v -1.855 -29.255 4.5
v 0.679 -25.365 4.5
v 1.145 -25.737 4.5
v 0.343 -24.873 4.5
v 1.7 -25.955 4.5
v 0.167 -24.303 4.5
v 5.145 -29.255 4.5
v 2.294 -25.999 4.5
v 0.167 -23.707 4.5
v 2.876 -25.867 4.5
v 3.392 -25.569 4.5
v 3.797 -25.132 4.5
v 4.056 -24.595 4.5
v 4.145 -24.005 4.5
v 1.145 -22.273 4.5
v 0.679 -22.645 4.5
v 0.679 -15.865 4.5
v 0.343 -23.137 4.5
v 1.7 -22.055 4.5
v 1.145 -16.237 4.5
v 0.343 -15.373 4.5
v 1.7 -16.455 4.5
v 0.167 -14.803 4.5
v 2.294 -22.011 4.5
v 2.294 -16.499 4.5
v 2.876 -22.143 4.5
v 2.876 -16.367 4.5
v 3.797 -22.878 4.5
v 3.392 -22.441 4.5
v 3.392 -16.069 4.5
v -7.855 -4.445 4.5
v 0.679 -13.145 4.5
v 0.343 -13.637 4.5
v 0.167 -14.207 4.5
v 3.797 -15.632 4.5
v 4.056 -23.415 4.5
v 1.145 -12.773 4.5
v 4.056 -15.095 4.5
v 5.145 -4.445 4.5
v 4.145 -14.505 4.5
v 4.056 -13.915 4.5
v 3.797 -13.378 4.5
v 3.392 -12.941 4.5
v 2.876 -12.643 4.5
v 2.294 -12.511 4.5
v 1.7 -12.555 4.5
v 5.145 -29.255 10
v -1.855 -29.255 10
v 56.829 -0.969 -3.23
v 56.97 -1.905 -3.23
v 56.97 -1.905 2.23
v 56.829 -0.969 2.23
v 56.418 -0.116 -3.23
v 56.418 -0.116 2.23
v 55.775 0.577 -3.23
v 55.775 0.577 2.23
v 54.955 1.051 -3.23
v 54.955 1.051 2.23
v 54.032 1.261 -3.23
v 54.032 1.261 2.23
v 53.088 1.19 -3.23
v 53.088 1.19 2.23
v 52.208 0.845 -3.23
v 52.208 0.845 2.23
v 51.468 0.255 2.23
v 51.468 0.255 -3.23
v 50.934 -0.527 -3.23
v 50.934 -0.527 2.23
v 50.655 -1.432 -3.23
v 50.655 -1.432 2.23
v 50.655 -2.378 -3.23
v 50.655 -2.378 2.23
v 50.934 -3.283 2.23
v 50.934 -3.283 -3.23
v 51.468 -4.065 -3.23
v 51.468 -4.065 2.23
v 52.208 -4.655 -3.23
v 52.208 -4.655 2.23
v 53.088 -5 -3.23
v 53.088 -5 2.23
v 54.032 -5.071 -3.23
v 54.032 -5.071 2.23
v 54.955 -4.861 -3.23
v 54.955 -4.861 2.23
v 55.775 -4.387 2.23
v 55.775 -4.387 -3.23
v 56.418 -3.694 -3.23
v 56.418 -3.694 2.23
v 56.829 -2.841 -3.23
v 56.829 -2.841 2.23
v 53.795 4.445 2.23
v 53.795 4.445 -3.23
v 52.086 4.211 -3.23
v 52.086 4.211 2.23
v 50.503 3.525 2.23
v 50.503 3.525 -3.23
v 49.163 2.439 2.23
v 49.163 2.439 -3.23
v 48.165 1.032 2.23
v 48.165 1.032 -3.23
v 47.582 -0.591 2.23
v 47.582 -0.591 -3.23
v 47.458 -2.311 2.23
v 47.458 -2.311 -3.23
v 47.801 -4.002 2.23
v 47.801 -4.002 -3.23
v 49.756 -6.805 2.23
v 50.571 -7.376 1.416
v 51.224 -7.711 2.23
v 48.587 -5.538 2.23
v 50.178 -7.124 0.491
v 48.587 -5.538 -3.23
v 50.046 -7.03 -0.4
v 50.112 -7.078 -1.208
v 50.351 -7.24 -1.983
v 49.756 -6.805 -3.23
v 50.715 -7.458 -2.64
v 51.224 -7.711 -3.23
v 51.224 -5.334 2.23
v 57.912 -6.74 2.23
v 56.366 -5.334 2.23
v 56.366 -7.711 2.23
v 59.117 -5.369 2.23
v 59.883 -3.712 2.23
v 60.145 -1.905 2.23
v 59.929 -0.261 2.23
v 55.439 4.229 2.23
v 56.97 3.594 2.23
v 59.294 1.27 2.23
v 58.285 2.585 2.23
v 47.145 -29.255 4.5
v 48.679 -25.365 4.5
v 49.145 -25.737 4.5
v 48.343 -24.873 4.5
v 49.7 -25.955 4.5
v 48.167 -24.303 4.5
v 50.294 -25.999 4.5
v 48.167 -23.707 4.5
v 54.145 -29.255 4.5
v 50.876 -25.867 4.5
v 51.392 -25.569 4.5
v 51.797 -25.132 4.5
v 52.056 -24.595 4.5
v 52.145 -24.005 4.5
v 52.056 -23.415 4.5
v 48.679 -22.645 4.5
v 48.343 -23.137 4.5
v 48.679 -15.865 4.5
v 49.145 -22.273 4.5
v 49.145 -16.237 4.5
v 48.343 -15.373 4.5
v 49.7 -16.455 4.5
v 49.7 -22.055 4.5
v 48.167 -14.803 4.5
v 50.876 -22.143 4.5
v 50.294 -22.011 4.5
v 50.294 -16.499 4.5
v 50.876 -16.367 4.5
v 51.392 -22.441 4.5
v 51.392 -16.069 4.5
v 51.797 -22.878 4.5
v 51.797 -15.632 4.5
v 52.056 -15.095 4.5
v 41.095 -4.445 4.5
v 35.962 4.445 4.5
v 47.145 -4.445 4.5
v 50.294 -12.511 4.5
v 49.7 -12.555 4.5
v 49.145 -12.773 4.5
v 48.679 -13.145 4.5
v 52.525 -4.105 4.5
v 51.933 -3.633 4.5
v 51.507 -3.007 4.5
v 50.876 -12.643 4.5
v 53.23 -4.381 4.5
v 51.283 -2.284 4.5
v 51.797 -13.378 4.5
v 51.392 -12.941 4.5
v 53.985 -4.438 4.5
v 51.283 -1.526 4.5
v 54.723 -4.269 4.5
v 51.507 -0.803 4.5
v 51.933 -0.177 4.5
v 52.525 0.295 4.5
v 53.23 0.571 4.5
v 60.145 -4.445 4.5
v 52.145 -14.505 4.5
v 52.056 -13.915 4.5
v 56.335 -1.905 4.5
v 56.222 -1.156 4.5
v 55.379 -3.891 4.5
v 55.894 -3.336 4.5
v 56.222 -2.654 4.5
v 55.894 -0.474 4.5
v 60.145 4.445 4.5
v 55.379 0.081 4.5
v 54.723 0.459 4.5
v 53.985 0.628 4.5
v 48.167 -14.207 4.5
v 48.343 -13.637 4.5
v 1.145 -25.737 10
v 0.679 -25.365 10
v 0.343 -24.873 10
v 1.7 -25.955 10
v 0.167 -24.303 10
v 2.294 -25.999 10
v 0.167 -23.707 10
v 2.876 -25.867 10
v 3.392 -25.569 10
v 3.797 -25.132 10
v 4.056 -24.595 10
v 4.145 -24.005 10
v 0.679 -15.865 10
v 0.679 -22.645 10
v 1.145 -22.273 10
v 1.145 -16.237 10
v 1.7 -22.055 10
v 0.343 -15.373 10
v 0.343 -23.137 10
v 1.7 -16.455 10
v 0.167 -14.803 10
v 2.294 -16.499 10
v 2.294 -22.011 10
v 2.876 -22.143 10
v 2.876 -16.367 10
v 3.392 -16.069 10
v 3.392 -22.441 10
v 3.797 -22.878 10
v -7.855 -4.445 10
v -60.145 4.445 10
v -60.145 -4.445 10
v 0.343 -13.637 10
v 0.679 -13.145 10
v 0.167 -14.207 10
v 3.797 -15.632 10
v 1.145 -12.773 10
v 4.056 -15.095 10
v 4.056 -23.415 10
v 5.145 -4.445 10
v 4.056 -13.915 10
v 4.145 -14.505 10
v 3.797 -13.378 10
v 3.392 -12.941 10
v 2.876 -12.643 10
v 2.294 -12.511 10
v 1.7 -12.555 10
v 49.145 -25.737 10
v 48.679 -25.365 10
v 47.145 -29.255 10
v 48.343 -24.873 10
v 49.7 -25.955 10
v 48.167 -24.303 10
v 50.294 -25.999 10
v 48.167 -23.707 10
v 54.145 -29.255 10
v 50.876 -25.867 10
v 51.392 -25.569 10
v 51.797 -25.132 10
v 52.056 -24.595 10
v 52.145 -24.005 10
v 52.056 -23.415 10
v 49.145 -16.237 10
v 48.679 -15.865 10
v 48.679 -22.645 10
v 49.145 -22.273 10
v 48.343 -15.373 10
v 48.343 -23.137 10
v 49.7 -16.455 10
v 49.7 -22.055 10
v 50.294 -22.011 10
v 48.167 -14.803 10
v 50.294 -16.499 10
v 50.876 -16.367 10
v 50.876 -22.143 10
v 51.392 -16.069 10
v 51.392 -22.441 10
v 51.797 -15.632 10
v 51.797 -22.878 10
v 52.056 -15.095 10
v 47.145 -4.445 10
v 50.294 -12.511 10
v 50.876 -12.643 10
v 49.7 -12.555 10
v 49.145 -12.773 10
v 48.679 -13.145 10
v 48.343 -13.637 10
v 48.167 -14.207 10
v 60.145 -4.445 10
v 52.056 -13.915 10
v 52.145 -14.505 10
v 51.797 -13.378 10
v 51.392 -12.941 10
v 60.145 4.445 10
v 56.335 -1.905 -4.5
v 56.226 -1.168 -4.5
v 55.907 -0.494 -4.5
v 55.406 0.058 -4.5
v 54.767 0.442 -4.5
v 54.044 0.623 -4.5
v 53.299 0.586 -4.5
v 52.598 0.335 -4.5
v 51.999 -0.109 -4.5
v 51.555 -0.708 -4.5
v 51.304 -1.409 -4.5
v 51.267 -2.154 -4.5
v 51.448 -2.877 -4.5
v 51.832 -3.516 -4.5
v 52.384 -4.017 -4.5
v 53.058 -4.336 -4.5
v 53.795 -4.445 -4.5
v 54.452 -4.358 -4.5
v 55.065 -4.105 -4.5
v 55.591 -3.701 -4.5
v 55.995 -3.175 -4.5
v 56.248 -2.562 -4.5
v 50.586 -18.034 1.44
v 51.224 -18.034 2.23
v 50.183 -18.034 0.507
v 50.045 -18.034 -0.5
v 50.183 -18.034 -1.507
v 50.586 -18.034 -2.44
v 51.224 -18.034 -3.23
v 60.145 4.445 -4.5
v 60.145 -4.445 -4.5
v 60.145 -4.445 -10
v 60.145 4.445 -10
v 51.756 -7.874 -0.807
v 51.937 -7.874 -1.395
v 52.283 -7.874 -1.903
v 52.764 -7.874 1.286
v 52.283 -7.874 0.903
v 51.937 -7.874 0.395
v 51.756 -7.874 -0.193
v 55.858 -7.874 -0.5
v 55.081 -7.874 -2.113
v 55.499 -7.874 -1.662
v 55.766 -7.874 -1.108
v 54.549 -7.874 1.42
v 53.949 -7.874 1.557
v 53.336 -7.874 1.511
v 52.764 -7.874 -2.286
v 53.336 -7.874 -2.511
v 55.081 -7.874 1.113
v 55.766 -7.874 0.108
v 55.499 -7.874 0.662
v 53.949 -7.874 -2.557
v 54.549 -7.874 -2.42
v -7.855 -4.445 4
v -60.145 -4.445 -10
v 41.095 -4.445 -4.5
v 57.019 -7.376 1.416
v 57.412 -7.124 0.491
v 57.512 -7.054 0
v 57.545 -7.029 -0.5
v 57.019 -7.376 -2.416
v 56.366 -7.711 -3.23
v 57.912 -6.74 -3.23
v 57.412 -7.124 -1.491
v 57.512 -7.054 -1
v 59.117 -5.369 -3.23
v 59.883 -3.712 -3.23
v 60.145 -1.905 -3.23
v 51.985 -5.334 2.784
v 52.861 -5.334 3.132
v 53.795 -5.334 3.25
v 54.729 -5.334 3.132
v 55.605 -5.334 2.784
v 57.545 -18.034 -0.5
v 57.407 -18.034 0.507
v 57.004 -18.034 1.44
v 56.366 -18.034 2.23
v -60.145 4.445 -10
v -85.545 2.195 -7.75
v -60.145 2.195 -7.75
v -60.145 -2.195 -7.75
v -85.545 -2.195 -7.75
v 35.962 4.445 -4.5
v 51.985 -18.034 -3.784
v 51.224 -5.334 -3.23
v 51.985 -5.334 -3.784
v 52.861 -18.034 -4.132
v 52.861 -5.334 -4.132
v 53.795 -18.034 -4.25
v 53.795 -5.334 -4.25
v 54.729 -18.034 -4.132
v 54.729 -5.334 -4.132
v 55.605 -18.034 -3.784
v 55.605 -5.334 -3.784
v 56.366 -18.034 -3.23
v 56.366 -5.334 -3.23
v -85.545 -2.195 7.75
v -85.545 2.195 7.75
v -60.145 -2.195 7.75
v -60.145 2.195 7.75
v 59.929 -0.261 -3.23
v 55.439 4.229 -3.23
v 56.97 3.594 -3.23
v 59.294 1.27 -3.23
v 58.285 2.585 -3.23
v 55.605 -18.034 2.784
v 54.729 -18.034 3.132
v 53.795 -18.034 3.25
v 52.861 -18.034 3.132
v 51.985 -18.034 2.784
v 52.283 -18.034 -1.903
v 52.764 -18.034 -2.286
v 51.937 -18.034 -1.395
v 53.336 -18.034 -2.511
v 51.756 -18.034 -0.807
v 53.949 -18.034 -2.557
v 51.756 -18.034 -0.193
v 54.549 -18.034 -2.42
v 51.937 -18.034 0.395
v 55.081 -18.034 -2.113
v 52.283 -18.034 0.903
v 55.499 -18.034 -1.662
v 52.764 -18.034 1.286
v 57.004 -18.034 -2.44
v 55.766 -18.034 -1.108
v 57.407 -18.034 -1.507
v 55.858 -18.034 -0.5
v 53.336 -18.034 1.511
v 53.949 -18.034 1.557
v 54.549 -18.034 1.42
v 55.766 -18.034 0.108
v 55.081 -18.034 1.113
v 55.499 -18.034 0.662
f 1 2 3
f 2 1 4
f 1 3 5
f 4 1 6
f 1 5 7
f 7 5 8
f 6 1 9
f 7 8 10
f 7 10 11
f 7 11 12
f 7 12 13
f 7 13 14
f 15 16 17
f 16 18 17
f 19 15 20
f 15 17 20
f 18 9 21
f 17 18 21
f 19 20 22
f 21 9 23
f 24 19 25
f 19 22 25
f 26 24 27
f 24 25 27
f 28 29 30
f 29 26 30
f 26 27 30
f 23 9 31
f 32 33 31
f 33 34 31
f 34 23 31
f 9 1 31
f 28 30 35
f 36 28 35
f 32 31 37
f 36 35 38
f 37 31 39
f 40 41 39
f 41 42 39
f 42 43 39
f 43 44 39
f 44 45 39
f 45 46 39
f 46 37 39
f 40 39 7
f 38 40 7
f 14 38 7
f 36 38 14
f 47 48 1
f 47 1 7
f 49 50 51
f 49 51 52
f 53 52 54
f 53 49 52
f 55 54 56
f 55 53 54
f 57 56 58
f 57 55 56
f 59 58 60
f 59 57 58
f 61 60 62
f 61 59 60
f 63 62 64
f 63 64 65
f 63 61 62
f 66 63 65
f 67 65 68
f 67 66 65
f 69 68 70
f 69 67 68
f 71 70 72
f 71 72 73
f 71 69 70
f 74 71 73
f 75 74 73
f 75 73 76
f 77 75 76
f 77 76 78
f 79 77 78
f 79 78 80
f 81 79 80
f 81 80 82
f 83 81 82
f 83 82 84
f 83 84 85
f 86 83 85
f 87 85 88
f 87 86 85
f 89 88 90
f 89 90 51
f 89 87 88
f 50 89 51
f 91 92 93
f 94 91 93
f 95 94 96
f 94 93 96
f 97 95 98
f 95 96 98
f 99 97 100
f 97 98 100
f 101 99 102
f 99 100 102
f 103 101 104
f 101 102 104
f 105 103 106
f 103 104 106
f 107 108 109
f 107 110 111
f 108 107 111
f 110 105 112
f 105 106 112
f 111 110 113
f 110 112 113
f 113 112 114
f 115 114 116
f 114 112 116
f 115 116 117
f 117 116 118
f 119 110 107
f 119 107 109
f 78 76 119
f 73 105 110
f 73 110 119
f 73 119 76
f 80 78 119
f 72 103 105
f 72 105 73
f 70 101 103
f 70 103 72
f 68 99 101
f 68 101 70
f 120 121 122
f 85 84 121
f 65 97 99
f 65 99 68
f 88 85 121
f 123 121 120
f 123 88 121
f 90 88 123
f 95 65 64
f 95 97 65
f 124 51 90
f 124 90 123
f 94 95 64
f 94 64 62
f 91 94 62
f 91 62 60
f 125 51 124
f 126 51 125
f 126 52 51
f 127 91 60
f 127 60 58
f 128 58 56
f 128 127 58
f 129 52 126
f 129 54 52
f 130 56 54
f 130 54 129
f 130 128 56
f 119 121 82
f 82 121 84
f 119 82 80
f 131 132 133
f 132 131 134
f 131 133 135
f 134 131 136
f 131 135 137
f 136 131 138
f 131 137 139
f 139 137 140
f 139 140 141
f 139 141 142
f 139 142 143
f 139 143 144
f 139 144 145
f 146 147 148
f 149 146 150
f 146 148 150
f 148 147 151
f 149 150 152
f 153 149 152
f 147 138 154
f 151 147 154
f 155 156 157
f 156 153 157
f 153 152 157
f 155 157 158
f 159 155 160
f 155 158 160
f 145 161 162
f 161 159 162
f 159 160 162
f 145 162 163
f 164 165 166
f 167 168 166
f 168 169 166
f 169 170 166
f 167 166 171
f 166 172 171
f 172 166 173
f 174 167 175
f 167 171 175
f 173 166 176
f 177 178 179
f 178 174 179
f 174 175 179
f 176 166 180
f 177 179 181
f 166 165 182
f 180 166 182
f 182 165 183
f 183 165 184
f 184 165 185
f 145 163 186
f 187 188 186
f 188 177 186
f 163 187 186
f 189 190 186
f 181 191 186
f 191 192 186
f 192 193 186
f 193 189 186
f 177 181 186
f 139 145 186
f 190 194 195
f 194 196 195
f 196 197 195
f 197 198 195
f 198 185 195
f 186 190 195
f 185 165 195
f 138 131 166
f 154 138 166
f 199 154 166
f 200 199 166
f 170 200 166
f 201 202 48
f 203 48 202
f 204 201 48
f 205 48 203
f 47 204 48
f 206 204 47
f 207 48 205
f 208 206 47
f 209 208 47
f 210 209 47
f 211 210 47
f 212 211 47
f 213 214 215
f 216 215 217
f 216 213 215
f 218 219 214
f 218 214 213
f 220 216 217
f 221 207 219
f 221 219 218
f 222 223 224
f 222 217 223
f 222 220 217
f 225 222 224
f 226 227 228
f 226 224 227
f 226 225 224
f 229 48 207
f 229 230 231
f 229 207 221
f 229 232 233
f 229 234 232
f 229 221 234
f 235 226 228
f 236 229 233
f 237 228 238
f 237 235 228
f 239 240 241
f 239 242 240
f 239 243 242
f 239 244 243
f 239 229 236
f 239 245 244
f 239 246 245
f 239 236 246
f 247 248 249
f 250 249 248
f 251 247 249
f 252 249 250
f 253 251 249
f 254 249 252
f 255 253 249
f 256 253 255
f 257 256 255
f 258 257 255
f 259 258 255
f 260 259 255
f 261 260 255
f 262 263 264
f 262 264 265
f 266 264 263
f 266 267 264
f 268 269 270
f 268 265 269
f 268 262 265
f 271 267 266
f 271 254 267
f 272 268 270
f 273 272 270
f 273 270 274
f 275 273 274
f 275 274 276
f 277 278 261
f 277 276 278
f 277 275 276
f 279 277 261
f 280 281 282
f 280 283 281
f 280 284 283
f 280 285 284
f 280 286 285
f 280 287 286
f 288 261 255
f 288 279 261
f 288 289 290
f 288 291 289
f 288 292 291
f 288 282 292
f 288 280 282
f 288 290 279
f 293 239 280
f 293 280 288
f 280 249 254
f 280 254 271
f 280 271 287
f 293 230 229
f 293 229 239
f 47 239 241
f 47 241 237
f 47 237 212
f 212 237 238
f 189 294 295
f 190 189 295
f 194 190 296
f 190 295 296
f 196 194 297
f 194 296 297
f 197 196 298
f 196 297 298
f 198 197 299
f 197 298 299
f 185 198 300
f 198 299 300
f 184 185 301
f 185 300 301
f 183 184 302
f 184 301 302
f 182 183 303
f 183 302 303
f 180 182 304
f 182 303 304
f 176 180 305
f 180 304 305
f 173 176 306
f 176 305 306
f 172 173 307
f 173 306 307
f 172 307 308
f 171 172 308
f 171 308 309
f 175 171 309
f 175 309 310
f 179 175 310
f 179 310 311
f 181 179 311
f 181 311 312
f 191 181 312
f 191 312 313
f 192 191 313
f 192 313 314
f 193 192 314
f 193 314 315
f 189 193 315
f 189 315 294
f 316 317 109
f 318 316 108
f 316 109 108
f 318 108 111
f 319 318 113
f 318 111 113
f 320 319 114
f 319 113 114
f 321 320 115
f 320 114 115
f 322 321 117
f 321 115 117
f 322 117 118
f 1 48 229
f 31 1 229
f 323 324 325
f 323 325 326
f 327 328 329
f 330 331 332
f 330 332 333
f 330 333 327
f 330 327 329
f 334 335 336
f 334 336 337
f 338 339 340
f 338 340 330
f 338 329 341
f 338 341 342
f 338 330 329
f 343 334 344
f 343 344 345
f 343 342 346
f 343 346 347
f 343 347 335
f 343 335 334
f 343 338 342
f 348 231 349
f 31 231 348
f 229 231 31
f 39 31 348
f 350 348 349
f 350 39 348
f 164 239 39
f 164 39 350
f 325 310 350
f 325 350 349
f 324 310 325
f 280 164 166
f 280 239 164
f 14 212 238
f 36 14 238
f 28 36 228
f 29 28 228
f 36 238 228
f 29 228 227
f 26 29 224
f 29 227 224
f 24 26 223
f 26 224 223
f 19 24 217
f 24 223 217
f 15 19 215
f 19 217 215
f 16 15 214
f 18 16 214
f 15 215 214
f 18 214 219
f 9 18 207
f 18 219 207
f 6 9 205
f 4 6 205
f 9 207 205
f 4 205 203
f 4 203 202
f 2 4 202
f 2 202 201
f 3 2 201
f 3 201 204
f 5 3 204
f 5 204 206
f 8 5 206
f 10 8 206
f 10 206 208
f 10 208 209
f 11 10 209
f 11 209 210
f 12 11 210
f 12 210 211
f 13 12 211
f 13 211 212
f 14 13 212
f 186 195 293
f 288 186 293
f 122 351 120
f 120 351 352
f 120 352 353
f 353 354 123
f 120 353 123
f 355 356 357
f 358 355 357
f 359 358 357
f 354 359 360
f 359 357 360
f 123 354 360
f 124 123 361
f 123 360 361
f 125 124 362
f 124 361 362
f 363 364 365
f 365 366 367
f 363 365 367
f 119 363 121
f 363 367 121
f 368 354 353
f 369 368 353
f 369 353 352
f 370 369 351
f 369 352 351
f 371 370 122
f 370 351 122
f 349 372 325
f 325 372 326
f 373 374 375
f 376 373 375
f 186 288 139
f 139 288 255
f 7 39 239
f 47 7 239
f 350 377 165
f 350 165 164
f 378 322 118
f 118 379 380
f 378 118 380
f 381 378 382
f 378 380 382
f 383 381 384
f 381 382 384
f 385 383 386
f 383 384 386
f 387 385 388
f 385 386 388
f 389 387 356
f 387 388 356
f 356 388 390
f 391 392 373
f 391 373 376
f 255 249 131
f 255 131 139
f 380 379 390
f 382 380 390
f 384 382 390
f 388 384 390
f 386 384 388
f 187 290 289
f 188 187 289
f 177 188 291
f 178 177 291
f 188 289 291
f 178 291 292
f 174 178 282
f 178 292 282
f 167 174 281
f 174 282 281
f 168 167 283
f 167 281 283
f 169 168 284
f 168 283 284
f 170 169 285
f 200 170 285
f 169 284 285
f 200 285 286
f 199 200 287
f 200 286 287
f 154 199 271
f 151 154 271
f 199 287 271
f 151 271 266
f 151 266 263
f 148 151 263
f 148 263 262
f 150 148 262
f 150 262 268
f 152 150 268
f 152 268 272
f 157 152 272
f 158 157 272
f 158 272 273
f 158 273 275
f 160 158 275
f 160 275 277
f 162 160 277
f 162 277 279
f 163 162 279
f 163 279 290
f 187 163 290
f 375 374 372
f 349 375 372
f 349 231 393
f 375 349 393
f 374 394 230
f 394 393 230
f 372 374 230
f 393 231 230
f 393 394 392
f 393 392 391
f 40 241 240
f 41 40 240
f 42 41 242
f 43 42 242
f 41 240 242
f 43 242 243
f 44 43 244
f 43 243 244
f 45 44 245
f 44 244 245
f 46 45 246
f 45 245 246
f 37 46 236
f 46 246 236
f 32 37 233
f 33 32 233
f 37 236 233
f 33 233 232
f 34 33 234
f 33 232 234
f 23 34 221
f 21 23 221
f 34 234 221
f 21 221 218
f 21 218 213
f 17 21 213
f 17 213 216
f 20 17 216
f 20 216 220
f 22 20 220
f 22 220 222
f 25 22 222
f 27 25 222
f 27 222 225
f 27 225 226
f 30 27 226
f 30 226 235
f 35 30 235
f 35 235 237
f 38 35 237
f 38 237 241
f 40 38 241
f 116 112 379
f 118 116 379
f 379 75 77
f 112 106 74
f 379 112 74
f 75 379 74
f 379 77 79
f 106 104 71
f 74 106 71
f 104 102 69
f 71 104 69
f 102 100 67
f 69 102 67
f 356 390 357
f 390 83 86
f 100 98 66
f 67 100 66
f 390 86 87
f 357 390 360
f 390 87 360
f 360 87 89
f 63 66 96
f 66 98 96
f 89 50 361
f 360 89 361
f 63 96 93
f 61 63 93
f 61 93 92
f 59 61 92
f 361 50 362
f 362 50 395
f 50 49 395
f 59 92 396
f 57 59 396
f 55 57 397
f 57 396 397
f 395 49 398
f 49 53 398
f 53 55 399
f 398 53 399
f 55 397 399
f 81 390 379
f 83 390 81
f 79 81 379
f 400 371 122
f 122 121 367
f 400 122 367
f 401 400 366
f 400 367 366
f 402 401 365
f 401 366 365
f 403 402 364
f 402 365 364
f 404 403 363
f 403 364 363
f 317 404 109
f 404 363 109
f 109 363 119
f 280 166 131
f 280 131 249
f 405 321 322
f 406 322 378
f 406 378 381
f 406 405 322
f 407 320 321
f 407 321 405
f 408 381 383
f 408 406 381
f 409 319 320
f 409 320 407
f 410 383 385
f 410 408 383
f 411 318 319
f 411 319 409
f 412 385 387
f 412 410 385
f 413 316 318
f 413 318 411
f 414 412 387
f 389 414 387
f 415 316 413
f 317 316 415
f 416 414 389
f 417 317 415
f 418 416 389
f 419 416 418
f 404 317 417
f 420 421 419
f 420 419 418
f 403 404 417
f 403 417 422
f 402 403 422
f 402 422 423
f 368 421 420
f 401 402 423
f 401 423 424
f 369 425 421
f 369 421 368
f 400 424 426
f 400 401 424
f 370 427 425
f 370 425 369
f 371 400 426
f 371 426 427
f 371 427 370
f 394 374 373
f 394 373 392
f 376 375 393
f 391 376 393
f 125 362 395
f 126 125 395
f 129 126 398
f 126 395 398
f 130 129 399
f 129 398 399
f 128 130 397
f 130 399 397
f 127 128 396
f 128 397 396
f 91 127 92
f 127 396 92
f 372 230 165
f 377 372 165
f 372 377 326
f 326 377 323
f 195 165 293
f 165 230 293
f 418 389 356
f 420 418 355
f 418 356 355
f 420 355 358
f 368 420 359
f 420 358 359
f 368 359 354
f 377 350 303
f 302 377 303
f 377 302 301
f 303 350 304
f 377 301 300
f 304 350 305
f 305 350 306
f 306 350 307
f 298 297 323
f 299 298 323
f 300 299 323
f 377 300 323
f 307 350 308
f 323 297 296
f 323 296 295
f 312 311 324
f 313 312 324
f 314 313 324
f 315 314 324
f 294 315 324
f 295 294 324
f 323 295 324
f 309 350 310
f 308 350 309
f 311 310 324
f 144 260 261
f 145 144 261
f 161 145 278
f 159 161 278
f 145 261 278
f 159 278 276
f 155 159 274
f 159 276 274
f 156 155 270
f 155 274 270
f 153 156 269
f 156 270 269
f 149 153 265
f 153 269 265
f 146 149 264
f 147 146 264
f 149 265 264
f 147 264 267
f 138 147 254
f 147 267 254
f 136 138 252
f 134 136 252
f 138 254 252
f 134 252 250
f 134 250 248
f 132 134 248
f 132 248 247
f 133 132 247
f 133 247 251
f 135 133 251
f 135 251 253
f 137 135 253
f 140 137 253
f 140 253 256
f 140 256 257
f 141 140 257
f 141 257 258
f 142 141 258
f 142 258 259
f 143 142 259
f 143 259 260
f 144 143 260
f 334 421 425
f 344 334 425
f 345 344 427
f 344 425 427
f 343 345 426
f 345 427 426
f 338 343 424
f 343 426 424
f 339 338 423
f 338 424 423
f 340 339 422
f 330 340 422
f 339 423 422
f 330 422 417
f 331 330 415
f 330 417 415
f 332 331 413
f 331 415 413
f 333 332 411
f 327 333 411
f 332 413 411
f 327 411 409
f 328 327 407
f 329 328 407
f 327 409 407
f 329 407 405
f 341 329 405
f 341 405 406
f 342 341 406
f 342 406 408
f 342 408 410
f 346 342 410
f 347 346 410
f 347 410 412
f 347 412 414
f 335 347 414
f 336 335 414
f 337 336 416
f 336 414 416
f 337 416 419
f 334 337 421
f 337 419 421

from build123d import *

# Parameters (mm, degrees)
F0_W      = 120.2900058
F0_H      = 8.89
F1_DEPTH  = 10
F2_W      = 4.39
F2_H      = 15.5
F3_DEPTH  = 25.4
F4_W      = 19.05
F4_H      = 9
F5_DEPTH  = 8.891
F6_R      = 2.54
F7_DEPTH  = 9
F9_R      = 3.175
F10_DEPTH = 5.46
F13_DEPTH = 12.7
F14_R     = 2.0625
F15_DEPTH = 10.16
F16_W     = 13
F16_H     = 5.5
F17_DEPTH = 24.81
F19_DEPTH = 6
F20_R     = 2
F21_DEPTH = 6
F23_DEPTH = 9


with BuildPart() as f1:
    # F0 (on Top) → F1 (new body, symmetric)
    with BuildSketch(Plane.XY):
        Rectangle(F0_W, F0_H)
    extrude(amount=F1_DEPTH, both=True)

    # F2 (on face) → F3 (join)
    with BuildSketch(Plane(origin=(-60.1450029, 0, 0), x_dir=(0, -1, 0), z_dir=(-1, 0, 0))):
        Rectangle(F2_W, F2_H)
    extrude(amount=F3_DEPTH)

    # F4 (on face) → F5 (cut, through all)
    with BuildSketch(Plane.XZ.offset(4.445)):
        with Locations((50.6200029, 0)):
            Rectangle(F4_W, F4_H)
    extrude(amount=-F5_DEPTH, mode=Mode.SUBTRACT)

    # F6 (on face) → F7 (join, through all)
    with BuildSketch(Plane.XY.offset(-4.5)):
        with Locations((53.7950029, -1.905)):
            Circle(F6_R)
    extrude(amount=F7_DEPTH)

    # F16 (on face) → F17 (join)
    with BuildSketch(Plane.XZ.offset(4.445)):
        with Locations((-1.3549971, 7.25)):
            Rectangle(F16_W, F16_H)
        with Locations((53.6450029, 7.25)):
            Rectangle(F16_W, F16_H)
    extrude(amount=F17_DEPTH)

    # F18 (on face) → F19 (cut)
    with BuildSketch(Plane.XY.offset(10)):
        Polygon((-1.8549971, -29.255), (-7.8549971, -4.445), (-7.8549971, -29.255), align=None)
        Polygon((60.1450029, -29.255), (60.1450029, -4.445), (54.1450029, -29.255), align=None)
    extrude(amount=-F19_DEPTH, mode=Mode.SUBTRACT)

    # F20 (on face) → F21 (cut)
    with BuildSketch(Plane.XY.offset(10)):
        with Locations((50.1450029, -24.005)):
            Circle(F20_R)
        with Locations((50.1450029, -14.505)):
            Circle(F20_R)
        with Locations((2.1450029, -24.005)):
            Circle(F20_R)
        with Locations((2.1450029, -14.505)):
            Circle(F20_R)
    extrude(amount=-F21_DEPTH, mode=Mode.SUBTRACT)

    # F22 (on face) → F23 (cut)
    with BuildSketch(Plane.XY.offset(-4.5)):
        Polygon((35.9623590069, 4.445), (41.0950029, -4.445), (41.0950029, 4.445), align=None)
    extrude(amount=F23_DEPTH, mode=Mode.SUBTRACT)


with BuildPart() as f10:
    # F9 (on offset) → F10 (new body)
    with BuildSketch(Plane.XY.offset(-3.23)):
        with BuildLine():
            ThreePointArc((53.7950029, 4.445), (49.3048748395, -6.3951280605), (60.1450029, -1.905))
            ThreePointArc((60.1450029, -1.905), (58.2851309605, 2.5851280605), (53.7950029, 4.445))
        make_face()
        with Locations((53.7950029, -1.905)):
            Circle(F9_R, mode=Mode.SUBTRACT)
    extrude(amount=F10_DEPTH)

    # F12 (on offset) → F13 (join)
    with BuildSketch(Plane.XZ.offset(5.334)):
        with BuildLine():
            ThreePointArc((51.2240886657, -3.23), (53.7950029, -4.25), (56.3659171343, -3.23))
            Line((56.3659171343, -3.23), (51.2240886657, -3.23))
        make_face()
        with BuildLine():
            Line((51.2240886657, -3.23), (56.3659171343, -3.23))
            ThreePointArc((56.3659171343, -3.23), (57.2376347696, -1.986871148), (57.5450029, -0.5))
            ThreePointArc((57.5450029, -0.5), (57.2376347696, 0.986871148), (56.3659171343, 2.23))
            Line((56.3659171343, 2.23), (51.2240886657, 2.23))
            ThreePointArc((51.2240886657, 2.23), (50.0450029, -0.5), (51.2240886657, -3.23))
        make_face()
        with BuildLine():
            ThreePointArc((56.3659171343, 2.23), (53.7950029, 3.25), (51.2240886657, 2.23))
            Line((51.2240886657, 2.23), (56.3659171343, 2.23))
        make_face()
    extrude(amount=F13_DEPTH)

    # F14 (on face) → F15 (cut)
    with BuildSketch(Plane.XZ.offset(18.034)):
        with Locations((53.7950029, -0.5)):
            Circle(F14_R)
    extrude(amount=-F15_DEPTH, mode=Mode.SUBTRACT)


solid = Compound([f1.part, f10.part])
